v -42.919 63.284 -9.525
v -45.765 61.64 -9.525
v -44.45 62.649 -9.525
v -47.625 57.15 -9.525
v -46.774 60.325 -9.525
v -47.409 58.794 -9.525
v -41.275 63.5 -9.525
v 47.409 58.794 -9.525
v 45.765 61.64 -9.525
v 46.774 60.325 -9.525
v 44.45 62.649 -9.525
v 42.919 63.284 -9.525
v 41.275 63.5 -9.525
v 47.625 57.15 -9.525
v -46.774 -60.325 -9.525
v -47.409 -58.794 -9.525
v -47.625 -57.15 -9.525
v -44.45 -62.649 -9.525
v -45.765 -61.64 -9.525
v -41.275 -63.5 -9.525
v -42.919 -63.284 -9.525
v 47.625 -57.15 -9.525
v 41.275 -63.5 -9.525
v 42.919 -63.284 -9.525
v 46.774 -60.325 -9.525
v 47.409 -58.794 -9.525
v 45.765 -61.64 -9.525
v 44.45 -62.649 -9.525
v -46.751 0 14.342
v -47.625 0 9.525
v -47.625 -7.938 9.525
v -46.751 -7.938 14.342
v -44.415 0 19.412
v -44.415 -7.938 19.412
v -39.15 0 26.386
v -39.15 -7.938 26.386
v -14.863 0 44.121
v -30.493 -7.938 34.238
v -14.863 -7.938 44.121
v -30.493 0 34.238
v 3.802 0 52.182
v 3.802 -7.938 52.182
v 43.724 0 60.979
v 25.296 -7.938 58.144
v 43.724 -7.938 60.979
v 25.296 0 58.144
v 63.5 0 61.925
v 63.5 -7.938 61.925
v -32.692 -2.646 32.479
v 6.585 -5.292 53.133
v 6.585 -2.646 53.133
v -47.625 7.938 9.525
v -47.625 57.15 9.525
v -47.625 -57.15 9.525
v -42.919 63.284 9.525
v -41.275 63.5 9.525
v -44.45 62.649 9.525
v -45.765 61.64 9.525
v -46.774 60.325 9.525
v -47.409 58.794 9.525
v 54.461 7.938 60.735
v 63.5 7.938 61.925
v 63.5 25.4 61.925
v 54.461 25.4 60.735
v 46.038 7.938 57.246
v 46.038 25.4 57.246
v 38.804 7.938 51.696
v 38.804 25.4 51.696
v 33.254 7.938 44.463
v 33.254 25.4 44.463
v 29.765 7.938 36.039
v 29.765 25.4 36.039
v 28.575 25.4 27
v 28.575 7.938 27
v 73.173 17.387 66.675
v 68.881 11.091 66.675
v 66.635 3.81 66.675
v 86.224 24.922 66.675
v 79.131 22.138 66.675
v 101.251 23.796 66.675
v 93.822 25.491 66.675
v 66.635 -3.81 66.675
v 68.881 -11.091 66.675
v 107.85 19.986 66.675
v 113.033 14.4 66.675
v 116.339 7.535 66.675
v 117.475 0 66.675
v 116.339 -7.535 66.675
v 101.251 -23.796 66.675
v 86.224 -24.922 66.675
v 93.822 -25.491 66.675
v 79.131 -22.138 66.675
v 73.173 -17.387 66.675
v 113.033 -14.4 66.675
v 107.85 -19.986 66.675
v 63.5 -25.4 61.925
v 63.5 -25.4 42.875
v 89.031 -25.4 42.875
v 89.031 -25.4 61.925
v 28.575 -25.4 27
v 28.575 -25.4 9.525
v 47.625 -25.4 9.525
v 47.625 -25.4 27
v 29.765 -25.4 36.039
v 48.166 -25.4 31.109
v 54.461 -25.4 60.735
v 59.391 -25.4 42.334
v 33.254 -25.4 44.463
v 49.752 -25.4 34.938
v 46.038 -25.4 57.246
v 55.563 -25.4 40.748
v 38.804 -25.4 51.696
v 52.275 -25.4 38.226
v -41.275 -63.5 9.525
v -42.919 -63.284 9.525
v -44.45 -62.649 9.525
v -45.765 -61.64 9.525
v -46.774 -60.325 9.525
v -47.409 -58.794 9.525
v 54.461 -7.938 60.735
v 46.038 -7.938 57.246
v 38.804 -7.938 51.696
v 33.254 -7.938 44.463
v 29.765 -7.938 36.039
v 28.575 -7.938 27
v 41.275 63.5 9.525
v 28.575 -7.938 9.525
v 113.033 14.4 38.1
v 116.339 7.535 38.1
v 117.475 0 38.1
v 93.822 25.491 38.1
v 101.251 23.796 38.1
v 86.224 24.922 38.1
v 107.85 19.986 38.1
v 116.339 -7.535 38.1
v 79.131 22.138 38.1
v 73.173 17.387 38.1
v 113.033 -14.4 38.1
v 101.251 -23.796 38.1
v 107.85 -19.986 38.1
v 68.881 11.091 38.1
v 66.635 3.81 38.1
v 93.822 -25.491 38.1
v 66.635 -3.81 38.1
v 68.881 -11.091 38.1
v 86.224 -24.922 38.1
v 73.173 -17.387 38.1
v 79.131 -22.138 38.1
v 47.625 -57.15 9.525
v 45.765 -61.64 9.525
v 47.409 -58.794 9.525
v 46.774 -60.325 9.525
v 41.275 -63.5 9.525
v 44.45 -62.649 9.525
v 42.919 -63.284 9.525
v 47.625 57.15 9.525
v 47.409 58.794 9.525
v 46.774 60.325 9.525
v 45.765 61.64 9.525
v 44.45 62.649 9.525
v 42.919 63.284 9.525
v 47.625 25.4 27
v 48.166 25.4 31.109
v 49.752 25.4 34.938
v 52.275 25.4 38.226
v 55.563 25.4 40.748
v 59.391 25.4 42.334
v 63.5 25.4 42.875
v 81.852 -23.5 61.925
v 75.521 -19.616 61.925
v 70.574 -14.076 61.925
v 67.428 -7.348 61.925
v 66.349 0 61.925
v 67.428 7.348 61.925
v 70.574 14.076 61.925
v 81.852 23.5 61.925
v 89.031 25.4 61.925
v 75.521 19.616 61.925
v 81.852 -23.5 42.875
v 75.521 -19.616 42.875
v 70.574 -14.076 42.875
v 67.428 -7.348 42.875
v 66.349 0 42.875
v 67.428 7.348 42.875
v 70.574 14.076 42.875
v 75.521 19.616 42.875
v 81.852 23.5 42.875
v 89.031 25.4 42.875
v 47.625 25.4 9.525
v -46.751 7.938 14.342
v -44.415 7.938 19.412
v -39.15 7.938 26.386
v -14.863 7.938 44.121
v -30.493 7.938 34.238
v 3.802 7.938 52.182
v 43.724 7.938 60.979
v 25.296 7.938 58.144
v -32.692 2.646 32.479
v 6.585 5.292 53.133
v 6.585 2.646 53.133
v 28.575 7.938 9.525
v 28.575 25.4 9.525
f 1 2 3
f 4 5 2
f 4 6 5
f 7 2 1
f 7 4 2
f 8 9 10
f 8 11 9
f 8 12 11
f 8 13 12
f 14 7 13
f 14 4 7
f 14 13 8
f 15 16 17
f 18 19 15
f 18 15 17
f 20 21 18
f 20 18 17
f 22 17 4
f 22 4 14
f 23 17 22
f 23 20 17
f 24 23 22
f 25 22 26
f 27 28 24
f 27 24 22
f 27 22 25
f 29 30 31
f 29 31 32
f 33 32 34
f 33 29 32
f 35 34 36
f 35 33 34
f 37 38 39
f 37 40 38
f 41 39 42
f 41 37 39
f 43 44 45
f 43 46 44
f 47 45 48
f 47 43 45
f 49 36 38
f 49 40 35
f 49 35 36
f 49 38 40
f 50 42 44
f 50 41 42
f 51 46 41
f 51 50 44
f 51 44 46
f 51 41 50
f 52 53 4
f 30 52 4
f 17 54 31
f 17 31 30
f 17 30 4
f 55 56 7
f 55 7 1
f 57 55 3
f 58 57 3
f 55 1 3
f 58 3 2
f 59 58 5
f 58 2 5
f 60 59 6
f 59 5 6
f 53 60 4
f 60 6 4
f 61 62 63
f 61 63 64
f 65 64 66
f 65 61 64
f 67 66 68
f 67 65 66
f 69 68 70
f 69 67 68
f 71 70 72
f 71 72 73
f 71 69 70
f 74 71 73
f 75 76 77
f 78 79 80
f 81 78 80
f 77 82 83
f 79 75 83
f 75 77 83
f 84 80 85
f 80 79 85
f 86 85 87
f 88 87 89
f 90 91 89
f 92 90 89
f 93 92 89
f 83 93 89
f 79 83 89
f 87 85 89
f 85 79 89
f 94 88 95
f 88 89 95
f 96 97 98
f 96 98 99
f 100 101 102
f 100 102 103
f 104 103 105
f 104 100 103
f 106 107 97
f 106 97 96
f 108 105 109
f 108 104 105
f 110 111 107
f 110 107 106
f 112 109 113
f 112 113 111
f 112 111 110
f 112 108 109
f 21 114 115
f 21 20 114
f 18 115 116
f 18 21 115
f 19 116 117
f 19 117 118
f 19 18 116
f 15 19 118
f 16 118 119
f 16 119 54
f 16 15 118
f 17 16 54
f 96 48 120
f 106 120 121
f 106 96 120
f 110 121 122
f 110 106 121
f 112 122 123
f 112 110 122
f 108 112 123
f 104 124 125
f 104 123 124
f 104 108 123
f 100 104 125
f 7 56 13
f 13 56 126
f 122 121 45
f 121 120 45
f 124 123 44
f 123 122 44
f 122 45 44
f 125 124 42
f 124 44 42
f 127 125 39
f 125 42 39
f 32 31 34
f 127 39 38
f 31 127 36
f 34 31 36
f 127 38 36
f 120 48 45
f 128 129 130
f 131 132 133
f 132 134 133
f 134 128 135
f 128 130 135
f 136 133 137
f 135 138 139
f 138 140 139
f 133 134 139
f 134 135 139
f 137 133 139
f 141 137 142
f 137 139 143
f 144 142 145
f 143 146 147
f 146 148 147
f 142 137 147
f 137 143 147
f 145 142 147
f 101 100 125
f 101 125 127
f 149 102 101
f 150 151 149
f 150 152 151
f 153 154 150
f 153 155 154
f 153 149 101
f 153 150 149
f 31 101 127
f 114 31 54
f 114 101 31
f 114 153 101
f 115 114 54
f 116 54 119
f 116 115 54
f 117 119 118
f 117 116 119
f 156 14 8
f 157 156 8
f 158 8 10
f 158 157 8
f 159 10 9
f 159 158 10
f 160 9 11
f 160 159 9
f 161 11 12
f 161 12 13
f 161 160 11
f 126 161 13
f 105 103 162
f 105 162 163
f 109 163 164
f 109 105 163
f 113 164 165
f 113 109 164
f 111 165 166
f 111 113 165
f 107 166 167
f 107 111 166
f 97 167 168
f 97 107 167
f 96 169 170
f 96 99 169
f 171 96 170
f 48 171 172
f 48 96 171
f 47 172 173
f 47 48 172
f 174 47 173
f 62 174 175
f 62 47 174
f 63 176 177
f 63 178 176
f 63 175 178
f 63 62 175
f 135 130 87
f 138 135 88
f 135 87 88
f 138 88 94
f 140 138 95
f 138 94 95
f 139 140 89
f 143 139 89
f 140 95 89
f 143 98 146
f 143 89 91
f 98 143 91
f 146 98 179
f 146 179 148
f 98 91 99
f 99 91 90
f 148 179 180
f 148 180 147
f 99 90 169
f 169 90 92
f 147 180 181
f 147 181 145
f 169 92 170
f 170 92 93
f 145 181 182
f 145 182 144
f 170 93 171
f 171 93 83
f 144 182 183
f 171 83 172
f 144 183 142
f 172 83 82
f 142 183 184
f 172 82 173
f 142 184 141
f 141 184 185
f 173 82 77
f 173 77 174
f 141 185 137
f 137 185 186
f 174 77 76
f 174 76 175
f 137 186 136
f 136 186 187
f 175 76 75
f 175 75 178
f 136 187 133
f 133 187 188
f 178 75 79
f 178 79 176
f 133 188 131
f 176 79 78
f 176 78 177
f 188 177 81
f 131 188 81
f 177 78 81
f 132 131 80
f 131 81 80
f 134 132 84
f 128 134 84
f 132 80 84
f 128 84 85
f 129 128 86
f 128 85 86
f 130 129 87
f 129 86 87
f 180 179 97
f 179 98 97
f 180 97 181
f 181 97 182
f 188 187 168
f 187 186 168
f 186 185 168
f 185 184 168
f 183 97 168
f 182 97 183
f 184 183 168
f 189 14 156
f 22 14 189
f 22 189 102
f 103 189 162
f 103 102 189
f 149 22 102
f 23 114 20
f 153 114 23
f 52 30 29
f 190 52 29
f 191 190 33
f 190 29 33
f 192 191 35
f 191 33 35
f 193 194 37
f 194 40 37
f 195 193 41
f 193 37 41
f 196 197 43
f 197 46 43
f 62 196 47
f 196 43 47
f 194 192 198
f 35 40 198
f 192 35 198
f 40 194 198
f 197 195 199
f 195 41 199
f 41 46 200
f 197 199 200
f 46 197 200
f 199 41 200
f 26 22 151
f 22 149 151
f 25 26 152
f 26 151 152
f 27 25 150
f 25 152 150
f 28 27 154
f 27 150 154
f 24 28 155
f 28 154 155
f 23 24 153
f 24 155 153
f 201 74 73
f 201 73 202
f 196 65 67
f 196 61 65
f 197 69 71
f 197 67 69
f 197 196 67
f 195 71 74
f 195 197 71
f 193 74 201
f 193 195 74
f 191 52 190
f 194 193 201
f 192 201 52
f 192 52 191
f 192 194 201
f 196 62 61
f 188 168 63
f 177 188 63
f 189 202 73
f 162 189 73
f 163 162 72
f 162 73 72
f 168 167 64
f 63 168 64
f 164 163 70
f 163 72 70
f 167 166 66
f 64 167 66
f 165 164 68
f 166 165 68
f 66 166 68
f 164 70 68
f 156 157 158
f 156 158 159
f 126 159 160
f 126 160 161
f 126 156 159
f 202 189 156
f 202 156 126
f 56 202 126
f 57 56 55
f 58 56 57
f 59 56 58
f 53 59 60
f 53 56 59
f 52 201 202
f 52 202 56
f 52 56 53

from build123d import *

# Parameters (mm, degrees)
F1_DEPTH  = 63.5
F2_DEPTH  = 25.4
F3_DEPTH  = 7.9375
F2_FACE_W = 50.8
F2_FACE_H = 19.05
F4_DEPTH  = 25.4
F6_R      = 6.35


with BuildPart() as f1:
    # F0 (on Front) → F1 (new body, symmetric)
    with BuildSketch(Plane.XZ):
        Polygon((-47.625, -9.525), (47.625, -9.525), (47.625, 9.525), (28.575, 9.525), (-47.625, 9.525), align=None)
    extrude(amount=F1_DEPTH, both=True)

    # F0 (on Front) → F2 (join, symmetric)
    with BuildSketch(Plane.XZ):
        with BuildLine():
            Line((28.575, 9.525), (47.625, 9.525))
            Line((47.625, 9.525), (47.625, 27.0002))
            ThreePointArc((47.625, 27.0002), (52.27468, 38.22552), (63.5, 42.8752))
            Line((63.5, 42.8752), (66.675, 42.8752))
            Line((66.675, 42.8752), (66.675, 61.9252))
            Line((66.675, 61.9252), (63.5, 61.9252))
            ThreePointArc((63.5, 61.9252), (38.804296, 51.695904), (28.575, 27.0002))
            Line((28.575, 27.0002), (28.575, 9.525))
        make_face()
    extrude(amount=F2_DEPTH, both=True)

    # F0 (on Front) → F3 (join, symmetric)
    with BuildSketch(Plane.XZ):
        with BuildLine():
            add(Edge.make_bspline(
                [(-47.625, 9.525), (-47.097944, 30.442789), (0, 62.250186), (63.5, 61.9252)],
                knots=[0, 0, 0, 0, 122.859866, 122.859866, 122.859866, 122.859866], degree=3))
            Line((-47.625, 9.525), (28.575, 9.525))
            Line((28.575, 9.525), (28.575, 27.0002))
            ThreePointArc((28.575, 27.0002), (38.804296, 51.695904), (63.5, 61.9252))
        make_face()
    extrude(amount=F3_DEPTH, both=True)

    # F2_face (on face) → F4 (join)
    with BuildSketch(Plane(origin=(66.675, 0, 52.4002), x_dir=(0, 1, 0), z_dir=(1, 0, 0))):
        Rectangle(F2_FACE_W, F2_FACE_H)
    extrude(amount=F4_DEPTH)

    # F0 (on Front) → F5 (revolve)
    with BuildSketch(Plane.XZ):
        Polygon((91.912158, 66.675), (91.912158, 61.9252), (91.912158, 42.8752), (91.912158, 38.1), (117.475, 38.1), (117.475, 66.675), align=None)
    revolve(axis=Axis((91.912158, 0, 52.3875), (0, 0, -1)))

    # F6
    f6_edges = [f1.edges().sort_by_distance(p)[0] for p in [
        (47.625, 63.5, 0),
        (-47.625, 63.5, 0),
        (-47.625, -63.5, 0),
        (47.625, -63.5, 0),
    ]]
    fillet(f6_edges, radius=F6_R)


solid = f1.part
